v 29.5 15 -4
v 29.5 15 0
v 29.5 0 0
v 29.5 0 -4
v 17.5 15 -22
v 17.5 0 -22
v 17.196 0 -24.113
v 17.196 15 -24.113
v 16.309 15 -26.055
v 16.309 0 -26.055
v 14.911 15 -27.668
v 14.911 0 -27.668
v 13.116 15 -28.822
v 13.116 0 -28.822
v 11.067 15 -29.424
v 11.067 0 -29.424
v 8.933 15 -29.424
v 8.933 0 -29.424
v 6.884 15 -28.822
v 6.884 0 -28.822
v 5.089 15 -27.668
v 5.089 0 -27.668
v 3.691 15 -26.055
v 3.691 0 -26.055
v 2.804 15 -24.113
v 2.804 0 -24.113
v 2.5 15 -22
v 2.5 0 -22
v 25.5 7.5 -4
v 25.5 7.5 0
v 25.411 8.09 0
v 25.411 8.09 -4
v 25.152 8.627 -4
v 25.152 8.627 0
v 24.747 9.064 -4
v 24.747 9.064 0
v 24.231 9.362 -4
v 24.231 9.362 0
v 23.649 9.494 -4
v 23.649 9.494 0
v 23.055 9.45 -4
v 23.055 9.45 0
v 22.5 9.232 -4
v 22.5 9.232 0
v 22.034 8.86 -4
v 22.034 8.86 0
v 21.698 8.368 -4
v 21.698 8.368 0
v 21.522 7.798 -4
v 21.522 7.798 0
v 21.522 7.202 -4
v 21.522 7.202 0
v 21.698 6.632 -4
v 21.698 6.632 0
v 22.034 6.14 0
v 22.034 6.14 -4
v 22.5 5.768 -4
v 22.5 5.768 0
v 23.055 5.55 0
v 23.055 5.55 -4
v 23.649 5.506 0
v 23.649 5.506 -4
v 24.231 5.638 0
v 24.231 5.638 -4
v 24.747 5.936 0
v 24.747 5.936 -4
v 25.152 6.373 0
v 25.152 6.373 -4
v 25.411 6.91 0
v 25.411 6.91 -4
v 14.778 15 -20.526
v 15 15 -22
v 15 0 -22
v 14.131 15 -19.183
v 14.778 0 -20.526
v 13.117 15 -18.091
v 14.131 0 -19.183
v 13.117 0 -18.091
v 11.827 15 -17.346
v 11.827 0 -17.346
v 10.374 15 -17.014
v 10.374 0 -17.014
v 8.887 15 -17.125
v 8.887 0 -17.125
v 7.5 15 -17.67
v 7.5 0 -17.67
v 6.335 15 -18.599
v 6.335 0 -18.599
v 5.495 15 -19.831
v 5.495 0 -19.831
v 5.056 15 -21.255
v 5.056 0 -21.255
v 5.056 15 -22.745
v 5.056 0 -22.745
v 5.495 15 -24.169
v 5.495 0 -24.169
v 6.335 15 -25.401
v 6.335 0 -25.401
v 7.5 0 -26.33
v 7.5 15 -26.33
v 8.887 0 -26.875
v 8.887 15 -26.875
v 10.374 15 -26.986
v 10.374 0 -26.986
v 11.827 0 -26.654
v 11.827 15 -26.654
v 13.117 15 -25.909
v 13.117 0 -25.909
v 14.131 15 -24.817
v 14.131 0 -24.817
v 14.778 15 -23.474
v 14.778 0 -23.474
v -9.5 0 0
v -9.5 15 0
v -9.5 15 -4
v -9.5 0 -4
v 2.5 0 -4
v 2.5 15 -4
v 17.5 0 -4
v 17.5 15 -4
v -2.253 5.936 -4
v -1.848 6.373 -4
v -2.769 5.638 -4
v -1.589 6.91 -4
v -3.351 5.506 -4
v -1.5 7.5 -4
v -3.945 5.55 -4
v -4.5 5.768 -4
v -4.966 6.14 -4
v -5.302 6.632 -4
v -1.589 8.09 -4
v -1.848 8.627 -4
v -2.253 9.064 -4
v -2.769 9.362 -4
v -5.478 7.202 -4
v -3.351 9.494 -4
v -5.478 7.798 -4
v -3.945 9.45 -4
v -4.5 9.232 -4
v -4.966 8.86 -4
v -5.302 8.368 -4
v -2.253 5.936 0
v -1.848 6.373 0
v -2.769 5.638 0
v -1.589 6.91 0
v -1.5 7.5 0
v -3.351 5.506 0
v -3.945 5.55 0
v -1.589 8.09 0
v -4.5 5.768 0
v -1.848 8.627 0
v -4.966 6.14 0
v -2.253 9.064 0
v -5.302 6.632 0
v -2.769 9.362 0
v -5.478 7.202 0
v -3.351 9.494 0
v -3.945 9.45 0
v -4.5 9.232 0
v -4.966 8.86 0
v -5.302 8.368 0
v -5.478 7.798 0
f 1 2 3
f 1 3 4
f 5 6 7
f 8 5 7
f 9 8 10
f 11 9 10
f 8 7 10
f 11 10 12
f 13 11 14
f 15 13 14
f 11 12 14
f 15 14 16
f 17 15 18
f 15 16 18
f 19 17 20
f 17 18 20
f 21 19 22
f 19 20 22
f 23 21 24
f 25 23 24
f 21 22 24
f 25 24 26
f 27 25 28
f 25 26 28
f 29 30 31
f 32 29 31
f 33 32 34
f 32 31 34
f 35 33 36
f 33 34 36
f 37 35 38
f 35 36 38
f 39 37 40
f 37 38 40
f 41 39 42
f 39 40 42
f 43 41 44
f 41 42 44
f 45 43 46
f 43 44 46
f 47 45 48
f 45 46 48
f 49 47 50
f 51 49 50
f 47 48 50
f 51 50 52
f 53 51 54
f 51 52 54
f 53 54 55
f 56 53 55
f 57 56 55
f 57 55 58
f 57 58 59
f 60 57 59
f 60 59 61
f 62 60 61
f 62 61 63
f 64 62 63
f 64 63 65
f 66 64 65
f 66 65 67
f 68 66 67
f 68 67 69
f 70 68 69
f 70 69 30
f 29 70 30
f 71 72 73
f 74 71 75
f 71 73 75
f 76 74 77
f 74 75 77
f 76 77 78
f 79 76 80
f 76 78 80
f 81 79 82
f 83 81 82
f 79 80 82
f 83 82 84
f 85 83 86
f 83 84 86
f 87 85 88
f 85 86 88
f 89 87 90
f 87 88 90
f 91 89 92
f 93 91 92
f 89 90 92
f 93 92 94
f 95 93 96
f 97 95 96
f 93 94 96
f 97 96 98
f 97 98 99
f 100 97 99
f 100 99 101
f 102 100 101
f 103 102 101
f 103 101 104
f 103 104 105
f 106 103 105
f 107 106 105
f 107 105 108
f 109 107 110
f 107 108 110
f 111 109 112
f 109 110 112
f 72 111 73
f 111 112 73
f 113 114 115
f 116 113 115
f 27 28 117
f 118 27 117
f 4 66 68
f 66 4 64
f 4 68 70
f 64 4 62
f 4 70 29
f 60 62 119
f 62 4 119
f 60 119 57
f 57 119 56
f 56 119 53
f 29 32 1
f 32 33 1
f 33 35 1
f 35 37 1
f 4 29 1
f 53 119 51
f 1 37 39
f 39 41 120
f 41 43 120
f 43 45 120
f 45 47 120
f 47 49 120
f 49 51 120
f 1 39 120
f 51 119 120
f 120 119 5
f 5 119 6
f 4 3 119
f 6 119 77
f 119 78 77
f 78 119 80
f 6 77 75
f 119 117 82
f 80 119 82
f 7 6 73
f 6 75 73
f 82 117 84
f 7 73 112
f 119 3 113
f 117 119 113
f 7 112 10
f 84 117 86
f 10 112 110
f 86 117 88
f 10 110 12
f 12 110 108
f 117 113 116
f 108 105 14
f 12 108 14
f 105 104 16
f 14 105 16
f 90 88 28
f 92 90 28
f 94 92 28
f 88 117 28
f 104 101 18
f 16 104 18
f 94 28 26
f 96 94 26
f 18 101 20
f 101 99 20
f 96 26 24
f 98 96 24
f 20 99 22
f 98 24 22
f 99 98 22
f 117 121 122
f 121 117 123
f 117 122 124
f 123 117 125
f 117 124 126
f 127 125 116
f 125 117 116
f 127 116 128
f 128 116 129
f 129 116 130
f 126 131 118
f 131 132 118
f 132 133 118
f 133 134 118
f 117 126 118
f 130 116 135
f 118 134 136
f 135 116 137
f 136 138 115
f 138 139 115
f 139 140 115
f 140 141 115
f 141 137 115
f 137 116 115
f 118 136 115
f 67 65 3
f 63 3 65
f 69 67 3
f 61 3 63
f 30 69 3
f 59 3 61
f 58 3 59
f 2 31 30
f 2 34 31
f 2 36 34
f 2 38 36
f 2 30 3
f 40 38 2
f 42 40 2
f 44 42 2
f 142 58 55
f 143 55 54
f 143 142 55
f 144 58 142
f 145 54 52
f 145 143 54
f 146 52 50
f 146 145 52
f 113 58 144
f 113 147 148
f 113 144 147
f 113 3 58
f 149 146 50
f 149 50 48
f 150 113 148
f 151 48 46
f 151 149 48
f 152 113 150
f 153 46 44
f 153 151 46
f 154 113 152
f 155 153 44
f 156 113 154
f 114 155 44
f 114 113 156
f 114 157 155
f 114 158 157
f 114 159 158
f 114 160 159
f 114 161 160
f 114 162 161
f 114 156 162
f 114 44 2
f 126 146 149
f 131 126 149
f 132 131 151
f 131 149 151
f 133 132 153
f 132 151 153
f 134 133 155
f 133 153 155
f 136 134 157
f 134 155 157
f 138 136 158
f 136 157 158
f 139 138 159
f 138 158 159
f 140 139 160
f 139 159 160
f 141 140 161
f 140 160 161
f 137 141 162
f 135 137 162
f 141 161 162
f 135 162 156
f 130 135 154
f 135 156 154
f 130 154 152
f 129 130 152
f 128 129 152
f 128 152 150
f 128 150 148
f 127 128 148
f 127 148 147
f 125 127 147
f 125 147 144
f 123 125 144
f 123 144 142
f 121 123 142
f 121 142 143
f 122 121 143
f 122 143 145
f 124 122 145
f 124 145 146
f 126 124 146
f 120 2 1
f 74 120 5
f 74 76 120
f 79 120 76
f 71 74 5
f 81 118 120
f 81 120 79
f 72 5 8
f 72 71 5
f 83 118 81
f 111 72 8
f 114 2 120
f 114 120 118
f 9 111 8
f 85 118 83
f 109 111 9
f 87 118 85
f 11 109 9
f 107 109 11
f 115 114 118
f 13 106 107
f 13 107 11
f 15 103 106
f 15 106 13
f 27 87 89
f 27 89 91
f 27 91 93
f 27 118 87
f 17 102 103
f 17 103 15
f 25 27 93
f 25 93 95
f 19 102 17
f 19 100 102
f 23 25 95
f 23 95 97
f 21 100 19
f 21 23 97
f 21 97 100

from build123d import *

# Parameters (mm, degrees)
BOSS_EXTRU_1_DEPTH      = 15
BOSS_EXTRU_2_DEPTH      = 12
BOSS_EXTRU_2_DEPTH_BACK = 27
ESQUISSE2_W             = 4
ESQUISSE2_H             = 15
ESQUISSE3_R             = 2
ENL_V_MAT_EXTRU_1_DEPTH = 12


with BuildPart() as part:
    # Esquisse1 → Boss.-Extru.1 (new body)
    with BuildSketch(Plane(origin=(0, 0, 0), x_dir=(1, 0, 0), z_dir=(0, 1, 0))):
        with BuildLine():
            ThreePointArc((17.5, 22), (10, 29.5), (2.5, 22))
            Line((2.5, 22), (5, 22))
            ThreePointArc((5, 22), (10, 27), (15, 22))
            Line((15, 22), (17.5, 22))
        make_face()
        with BuildLine():
            Line((5, 22), (2.5, 22))
            ThreePointArc((2.5, 22), (10, 14.5), (17.5, 22))
            Line((17.5, 22), (15, 22))
            ThreePointArc((15, 22), (10, 17), (5, 22))
        make_face()
        with BuildLine():
            Line((2.5, 22), (2.5, 0))
            Line((2.5, 0), (17.5, 0))
            Line((17.5, 0), (17.5, 22))
            ThreePointArc((17.5, 22), (10, 14.5), (2.5, 22))
        make_face()
    extrude(amount=BOSS_EXTRU_1_DEPTH)

    # Esquisse2 → Boss.-Extru.2 (add, two sides: drawn at the far end of the back side and taken through both)
    with BuildSketch(Plane(origin=(17.5, 0, 0), x_dir=(0, 0, -1), z_dir=(1, 0, 0)).offset(-BOSS_EXTRU_2_DEPTH_BACK)):
        with Locations((2, 7.5)):
            Rectangle(ESQUISSE2_W, ESQUISSE2_H)
    extrude(amount=BOSS_EXTRU_2_DEPTH + BOSS_EXTRU_2_DEPTH_BACK)

    # Esquisse3 → Enlèv. mat.-Extru.1 (cut)
    with BuildSketch(Plane.XY):
        with Locations((-3.5, 7.5)):
            Circle(ESQUISSE3_R)
        with Locations((23.5, 7.5)):
            Circle(ESQUISSE3_R)
    extrude(amount=-ENL_V_MAT_EXTRU_1_DEPTH, mode=Mode.SUBTRACT)


solid = part.part
